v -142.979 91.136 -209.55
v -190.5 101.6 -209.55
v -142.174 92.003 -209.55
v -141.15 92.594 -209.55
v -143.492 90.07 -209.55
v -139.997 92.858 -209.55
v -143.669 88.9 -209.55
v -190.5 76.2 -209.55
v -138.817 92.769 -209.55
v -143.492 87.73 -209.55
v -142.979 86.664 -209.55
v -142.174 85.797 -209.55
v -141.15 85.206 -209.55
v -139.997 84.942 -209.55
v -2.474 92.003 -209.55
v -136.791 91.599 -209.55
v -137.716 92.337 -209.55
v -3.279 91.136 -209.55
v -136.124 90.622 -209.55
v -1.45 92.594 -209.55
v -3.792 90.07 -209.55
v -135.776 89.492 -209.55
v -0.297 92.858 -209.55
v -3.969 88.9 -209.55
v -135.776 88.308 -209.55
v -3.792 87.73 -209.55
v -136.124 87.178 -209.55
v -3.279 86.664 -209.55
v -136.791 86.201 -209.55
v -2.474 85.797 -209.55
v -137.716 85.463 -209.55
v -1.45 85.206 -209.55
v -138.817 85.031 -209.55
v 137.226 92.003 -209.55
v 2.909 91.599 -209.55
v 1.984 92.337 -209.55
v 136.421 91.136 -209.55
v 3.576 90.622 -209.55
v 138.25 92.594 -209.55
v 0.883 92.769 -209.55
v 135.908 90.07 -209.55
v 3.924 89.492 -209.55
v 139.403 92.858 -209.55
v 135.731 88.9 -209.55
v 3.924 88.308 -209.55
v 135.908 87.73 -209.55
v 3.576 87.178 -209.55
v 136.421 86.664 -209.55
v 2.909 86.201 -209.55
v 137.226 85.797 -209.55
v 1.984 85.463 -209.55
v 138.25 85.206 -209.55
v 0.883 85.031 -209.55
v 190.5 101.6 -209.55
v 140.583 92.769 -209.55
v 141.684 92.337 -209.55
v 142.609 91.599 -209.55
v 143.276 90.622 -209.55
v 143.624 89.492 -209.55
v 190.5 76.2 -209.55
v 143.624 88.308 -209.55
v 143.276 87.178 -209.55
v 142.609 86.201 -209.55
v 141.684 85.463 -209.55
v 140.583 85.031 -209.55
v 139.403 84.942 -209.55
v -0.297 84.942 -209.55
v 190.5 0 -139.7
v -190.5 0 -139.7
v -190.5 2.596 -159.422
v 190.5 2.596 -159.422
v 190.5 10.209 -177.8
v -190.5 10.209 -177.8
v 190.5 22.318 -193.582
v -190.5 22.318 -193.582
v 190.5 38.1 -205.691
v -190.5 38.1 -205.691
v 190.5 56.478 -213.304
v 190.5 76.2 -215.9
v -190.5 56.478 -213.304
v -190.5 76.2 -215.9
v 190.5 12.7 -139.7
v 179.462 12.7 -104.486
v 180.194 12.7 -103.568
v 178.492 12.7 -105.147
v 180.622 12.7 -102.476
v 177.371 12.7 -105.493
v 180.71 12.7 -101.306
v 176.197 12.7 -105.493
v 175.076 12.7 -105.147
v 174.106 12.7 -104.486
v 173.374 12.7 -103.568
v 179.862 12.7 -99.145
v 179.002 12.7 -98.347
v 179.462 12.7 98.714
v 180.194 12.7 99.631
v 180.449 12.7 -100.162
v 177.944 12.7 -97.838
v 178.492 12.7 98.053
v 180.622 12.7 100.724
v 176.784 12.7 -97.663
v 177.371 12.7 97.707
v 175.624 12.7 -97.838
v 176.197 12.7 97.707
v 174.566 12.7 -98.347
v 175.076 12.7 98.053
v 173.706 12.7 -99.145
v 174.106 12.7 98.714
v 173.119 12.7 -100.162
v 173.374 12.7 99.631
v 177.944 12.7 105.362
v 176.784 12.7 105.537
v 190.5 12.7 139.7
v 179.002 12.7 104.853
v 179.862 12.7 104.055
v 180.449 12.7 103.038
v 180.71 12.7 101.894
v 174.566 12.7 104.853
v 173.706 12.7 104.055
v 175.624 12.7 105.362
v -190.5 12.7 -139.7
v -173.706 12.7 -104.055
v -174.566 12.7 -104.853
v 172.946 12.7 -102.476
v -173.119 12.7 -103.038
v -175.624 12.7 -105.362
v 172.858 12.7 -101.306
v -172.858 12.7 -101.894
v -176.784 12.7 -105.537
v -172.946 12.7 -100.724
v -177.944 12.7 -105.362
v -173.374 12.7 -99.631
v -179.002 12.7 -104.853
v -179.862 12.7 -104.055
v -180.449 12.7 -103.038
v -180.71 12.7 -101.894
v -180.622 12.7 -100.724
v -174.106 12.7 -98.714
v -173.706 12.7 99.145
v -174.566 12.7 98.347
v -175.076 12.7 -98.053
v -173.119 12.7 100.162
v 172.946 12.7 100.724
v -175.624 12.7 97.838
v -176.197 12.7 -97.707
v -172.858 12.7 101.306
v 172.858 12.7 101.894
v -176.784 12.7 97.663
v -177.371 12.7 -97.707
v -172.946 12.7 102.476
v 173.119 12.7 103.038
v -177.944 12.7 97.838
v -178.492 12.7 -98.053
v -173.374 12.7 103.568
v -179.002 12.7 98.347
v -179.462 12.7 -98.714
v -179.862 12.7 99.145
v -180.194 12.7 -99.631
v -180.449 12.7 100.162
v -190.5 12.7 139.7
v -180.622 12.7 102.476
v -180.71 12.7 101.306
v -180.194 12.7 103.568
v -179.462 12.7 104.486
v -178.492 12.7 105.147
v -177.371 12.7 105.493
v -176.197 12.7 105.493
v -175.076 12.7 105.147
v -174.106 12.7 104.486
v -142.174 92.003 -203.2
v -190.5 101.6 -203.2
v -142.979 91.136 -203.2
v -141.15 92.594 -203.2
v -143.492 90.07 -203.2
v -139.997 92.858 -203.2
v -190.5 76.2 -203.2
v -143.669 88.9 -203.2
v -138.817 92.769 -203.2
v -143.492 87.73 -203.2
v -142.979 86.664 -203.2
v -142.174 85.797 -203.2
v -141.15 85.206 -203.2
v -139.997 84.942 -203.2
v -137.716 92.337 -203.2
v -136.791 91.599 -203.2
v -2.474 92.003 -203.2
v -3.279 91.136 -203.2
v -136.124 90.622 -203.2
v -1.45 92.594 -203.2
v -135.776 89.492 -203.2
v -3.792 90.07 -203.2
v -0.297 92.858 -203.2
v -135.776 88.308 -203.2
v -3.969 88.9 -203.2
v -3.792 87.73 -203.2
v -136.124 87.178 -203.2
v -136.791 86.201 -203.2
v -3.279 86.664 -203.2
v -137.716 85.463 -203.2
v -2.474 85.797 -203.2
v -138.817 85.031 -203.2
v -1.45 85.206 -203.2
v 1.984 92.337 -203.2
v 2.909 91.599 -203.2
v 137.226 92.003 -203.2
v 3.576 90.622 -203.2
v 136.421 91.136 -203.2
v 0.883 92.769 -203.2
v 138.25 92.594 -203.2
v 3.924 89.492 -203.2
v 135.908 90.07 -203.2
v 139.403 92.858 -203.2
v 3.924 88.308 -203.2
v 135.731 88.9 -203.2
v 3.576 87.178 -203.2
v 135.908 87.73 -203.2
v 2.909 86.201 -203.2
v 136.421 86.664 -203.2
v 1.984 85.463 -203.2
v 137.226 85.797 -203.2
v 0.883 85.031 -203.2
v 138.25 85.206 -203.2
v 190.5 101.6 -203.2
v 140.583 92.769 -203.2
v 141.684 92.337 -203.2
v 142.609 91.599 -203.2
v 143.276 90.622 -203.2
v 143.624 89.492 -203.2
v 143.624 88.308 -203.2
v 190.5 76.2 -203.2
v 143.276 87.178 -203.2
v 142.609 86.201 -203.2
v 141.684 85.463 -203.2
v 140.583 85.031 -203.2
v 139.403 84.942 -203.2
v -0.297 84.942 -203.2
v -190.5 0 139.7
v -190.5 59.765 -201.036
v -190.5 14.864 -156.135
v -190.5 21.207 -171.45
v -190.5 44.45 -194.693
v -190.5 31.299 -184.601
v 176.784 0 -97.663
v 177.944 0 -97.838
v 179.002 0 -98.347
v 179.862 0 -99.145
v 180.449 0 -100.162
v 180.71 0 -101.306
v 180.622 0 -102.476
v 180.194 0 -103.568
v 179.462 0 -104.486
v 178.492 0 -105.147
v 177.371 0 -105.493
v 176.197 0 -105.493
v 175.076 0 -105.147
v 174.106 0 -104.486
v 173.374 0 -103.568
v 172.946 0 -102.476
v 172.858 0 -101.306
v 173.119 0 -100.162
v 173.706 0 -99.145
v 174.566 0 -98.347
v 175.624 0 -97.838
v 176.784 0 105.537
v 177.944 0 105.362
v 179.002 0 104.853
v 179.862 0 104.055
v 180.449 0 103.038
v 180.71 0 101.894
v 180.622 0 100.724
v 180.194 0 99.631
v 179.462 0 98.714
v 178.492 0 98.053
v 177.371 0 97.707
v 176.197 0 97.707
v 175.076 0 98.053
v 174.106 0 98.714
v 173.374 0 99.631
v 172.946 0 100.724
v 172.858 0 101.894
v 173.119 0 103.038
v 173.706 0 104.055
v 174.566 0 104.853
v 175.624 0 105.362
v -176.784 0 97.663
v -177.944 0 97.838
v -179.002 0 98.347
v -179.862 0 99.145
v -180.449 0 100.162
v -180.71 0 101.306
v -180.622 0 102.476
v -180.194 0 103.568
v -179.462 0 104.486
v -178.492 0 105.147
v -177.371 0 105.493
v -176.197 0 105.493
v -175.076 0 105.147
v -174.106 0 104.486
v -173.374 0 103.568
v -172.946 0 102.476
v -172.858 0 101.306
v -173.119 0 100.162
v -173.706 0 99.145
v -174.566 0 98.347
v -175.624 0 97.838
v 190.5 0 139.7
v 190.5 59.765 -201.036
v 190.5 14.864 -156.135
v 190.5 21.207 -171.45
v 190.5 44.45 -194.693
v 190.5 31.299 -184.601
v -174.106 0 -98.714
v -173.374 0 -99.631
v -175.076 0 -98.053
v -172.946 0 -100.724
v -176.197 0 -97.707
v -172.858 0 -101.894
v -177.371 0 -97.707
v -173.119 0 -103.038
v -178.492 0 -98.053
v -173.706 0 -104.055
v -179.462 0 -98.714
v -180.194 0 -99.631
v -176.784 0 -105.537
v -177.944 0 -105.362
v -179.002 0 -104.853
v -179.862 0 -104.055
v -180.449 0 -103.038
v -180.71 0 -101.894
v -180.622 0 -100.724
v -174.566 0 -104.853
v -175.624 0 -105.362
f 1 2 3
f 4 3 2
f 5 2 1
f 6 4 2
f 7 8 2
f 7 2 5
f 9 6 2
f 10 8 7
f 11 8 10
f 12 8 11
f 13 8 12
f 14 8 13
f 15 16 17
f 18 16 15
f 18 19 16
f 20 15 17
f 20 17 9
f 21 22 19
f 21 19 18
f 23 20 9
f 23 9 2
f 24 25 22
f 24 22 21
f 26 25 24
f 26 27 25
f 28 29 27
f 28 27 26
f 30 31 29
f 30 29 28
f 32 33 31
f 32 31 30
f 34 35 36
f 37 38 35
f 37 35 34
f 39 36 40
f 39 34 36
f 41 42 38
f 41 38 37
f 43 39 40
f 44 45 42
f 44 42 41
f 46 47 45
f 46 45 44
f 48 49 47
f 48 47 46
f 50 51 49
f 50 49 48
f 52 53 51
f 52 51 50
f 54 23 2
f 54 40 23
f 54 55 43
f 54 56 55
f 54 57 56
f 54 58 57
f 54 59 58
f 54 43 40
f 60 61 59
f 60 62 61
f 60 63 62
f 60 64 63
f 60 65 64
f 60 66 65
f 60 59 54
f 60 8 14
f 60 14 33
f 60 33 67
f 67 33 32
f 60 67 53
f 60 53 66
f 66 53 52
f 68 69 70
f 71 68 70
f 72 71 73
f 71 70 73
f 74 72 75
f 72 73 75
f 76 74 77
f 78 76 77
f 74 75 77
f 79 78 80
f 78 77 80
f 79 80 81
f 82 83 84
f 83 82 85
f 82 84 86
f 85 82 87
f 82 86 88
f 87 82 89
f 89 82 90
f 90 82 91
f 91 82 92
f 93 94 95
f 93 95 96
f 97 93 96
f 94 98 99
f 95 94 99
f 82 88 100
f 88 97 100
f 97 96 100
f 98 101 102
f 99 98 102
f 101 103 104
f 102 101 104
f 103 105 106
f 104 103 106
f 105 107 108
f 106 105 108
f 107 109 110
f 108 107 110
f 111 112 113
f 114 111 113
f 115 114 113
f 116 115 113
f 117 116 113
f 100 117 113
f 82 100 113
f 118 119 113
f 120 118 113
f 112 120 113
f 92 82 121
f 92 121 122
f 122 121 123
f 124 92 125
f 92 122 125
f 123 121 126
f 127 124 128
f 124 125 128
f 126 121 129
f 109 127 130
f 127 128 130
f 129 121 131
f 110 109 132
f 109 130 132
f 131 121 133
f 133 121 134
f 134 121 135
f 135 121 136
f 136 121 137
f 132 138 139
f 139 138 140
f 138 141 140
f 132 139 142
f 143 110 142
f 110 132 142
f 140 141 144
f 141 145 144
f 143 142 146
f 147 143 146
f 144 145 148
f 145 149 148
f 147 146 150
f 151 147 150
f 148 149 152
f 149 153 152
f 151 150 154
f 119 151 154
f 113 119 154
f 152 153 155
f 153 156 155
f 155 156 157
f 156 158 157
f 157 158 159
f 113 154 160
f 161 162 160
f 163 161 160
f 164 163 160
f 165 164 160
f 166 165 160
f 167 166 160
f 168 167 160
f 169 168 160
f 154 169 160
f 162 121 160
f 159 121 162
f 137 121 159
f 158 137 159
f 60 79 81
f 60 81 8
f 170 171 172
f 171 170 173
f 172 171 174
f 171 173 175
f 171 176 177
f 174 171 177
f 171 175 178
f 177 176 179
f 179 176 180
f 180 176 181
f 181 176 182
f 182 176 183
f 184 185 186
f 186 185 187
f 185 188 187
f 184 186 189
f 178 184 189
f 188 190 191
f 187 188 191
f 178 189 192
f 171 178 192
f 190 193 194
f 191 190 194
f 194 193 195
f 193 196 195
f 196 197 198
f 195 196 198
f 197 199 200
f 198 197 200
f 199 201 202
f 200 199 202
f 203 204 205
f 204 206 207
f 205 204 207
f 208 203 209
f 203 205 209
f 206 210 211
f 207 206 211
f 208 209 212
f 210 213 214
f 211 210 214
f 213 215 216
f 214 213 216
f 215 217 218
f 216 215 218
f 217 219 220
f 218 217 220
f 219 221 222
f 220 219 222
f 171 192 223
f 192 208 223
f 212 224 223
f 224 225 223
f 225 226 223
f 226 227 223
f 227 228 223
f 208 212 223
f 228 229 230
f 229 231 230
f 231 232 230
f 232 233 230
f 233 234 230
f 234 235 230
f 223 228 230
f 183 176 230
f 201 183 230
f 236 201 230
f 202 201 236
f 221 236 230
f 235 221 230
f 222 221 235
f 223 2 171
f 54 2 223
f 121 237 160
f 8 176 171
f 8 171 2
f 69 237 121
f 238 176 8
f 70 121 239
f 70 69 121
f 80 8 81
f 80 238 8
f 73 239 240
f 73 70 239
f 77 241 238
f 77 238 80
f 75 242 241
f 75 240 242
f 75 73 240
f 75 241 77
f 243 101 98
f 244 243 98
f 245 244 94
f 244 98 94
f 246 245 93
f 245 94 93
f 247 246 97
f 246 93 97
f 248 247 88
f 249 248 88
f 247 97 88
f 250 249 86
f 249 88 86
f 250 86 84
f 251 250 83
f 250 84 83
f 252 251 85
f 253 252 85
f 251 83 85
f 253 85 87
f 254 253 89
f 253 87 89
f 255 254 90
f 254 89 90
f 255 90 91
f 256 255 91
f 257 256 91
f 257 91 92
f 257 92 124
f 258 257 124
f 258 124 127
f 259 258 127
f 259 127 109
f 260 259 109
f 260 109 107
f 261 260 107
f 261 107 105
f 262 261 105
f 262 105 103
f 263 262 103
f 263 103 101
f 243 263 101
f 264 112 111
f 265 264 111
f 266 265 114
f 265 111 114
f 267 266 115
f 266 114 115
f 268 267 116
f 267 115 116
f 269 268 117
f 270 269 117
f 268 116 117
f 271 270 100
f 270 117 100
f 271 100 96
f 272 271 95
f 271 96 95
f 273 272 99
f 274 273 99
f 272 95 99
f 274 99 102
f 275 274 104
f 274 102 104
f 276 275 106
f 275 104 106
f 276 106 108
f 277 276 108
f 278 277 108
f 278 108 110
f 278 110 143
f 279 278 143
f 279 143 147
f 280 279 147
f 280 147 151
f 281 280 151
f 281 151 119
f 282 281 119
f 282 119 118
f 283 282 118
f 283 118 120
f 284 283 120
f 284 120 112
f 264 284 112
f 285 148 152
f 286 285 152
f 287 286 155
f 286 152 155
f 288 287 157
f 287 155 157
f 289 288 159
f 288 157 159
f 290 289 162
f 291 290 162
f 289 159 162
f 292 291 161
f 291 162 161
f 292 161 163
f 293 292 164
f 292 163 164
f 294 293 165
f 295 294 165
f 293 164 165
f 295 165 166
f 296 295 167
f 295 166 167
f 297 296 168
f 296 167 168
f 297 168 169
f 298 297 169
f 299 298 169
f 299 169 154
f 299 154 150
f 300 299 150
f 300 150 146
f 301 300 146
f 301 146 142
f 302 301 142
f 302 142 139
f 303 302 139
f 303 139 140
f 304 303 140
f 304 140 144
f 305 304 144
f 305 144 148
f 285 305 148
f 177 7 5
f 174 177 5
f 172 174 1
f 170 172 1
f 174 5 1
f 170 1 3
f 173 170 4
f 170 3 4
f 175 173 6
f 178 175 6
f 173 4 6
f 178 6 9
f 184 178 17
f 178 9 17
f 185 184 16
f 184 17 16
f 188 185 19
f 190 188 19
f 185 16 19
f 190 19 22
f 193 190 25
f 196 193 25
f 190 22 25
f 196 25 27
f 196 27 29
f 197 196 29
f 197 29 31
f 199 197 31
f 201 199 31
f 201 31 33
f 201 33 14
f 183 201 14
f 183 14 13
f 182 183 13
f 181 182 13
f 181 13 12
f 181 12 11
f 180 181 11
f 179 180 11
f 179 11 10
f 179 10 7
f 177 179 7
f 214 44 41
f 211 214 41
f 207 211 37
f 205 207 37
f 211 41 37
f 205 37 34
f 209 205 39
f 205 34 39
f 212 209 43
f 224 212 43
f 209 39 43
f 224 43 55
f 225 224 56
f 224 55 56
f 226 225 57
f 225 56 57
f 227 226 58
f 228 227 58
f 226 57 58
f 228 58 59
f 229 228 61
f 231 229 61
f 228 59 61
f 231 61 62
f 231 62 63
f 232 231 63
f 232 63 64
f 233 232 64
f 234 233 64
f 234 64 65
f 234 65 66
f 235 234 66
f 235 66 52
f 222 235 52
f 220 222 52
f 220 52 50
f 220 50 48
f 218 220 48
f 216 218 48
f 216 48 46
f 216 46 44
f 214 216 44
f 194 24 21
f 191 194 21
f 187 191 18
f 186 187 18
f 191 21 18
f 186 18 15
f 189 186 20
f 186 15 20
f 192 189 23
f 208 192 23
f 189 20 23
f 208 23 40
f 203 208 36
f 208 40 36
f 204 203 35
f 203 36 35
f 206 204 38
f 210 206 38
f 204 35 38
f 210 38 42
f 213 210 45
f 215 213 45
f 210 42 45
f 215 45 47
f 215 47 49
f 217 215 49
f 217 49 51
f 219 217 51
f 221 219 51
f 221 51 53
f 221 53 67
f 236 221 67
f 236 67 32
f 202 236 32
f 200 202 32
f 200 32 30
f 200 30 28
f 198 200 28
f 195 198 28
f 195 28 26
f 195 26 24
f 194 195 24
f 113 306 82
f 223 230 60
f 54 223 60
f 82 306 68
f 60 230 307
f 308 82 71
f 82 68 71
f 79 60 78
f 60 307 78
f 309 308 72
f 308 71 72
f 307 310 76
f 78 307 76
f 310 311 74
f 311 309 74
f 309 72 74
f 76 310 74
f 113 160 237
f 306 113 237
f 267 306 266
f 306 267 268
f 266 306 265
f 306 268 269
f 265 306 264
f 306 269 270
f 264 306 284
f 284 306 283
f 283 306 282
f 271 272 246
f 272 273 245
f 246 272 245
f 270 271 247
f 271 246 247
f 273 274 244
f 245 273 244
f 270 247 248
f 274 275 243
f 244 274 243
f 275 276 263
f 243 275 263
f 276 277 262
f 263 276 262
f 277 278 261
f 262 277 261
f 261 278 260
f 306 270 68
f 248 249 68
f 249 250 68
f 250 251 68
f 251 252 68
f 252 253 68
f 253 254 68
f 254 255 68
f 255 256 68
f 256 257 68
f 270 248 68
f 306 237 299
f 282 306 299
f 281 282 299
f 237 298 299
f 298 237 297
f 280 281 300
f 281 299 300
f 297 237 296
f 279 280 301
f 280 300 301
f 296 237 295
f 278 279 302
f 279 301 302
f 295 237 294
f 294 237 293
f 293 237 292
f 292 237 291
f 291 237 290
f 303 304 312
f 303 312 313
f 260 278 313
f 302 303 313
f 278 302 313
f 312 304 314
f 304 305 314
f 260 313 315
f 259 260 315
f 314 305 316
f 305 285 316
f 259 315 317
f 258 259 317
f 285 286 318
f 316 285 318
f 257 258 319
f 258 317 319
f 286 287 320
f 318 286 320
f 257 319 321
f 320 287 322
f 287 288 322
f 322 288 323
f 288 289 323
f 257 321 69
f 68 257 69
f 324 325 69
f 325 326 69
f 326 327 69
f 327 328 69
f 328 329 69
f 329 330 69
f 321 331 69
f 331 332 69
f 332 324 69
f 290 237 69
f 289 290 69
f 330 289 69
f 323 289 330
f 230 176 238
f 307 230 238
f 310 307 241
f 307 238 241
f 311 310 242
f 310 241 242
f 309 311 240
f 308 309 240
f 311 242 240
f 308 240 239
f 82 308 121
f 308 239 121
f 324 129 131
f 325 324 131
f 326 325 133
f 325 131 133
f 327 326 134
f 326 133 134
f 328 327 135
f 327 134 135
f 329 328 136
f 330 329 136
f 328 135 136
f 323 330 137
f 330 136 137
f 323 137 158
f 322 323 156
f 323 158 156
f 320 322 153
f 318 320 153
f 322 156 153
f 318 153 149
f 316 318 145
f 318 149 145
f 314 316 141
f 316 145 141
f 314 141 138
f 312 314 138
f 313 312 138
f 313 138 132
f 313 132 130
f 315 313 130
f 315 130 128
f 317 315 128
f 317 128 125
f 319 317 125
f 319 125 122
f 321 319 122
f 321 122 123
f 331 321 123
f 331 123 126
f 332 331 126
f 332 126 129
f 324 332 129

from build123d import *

# Parameters (mm, degrees)
BOSS_EXTRUDE1_DEPTH      = 190.5
BOSS_EXTRUDE1_DEPTH_BACK = 190.5
SKETCH2_W                = 381
SKETCH2_H                = 6.35
BOSS_EXTRUDE2_DEPTH      = 25.4
SKETCH3_R                = 3.96875
CUT_EXTRUDE1_DEPTH       = 25.4
SKETCH4_R                = 3.937
CUT_EXTRUDE2_DEPTH       = 302.34078715


with BuildPart() as part:
    # Sketch1 → Boss-Extrude1 (new, two sides: drawn at the far end of the back side and taken through both)
    with BuildSketch(Plane(origin=(0, 0, 0), x_dir=(0, 0, -1), z_dir=(1, 0, 0)).offset(-BOSS_EXTRUDE1_DEPTH_BACK)):
        with BuildLine():
            Line((-139.7, 0), (139.7, 0))
            ThreePointArc((139.7, 0), (193.581536726, 22.318463274), (215.9, 76.2))
            Line((215.9, 76.2), (203.2, 76.2))
            ThreePointArc((203.2, 76.2), (184.601280605, 31.298719395), (139.7, 12.7))
            Line((139.7, 12.7), (-139.7, 12.7))
            Line((-139.7, 12.7), (-139.7, 0))
        make_face()
    extrude(amount=BOSS_EXTRUDE1_DEPTH + BOSS_EXTRUDE1_DEPTH_BACK)

    # Sketch2 → Boss-Extrude2 (add)
    with BuildSketch(Plane(origin=(0, 76.2, 0), x_dir=(1, 0, 0), z_dir=(0, 1, 0))):
        with Locations((0, 206.375)):
            Rectangle(SKETCH2_W, SKETCH2_H)
    extrude(amount=BOSS_EXTRUDE2_DEPTH)

    # Sketch3 → Cut-Extrude1 (cut)
    with BuildSketch(Plane(origin=(0, 0, -209.55), x_dir=(-1, 0, 0), z_dir=(0, 0, -1))):
        with Locations((-139.7, 88.9)):
            Circle(SKETCH3_R)
        with Locations((139.7, 88.9)):
            Circle(SKETCH3_R)
        with Locations((0, 88.9)):
            Circle(SKETCH3_R)
    extrude(amount=-CUT_EXTRUDE1_DEPTH, mode=Mode.SUBTRACT)

    # Sketch4 → Cut-Extrude2 (cut, through all)
    with BuildSketch(Plane(origin=(0, 12.7, 0), x_dir=(1, 0, 0), z_dir=(0, 1, 0))):
        with Locations((176.784, -101.6)):
            Circle(SKETCH4_R)
        with Locations((176.784, 101.6)):
            Circle(SKETCH4_R)
        with Locations((-176.784, -101.6)):
            Circle(SKETCH4_R)
        with Locations((-176.784, 101.6)):
            Circle(SKETCH4_R)
    extrude(amount=-CUT_EXTRUDE2_DEPTH, mode=Mode.SUBTRACT)


solid = part.part
